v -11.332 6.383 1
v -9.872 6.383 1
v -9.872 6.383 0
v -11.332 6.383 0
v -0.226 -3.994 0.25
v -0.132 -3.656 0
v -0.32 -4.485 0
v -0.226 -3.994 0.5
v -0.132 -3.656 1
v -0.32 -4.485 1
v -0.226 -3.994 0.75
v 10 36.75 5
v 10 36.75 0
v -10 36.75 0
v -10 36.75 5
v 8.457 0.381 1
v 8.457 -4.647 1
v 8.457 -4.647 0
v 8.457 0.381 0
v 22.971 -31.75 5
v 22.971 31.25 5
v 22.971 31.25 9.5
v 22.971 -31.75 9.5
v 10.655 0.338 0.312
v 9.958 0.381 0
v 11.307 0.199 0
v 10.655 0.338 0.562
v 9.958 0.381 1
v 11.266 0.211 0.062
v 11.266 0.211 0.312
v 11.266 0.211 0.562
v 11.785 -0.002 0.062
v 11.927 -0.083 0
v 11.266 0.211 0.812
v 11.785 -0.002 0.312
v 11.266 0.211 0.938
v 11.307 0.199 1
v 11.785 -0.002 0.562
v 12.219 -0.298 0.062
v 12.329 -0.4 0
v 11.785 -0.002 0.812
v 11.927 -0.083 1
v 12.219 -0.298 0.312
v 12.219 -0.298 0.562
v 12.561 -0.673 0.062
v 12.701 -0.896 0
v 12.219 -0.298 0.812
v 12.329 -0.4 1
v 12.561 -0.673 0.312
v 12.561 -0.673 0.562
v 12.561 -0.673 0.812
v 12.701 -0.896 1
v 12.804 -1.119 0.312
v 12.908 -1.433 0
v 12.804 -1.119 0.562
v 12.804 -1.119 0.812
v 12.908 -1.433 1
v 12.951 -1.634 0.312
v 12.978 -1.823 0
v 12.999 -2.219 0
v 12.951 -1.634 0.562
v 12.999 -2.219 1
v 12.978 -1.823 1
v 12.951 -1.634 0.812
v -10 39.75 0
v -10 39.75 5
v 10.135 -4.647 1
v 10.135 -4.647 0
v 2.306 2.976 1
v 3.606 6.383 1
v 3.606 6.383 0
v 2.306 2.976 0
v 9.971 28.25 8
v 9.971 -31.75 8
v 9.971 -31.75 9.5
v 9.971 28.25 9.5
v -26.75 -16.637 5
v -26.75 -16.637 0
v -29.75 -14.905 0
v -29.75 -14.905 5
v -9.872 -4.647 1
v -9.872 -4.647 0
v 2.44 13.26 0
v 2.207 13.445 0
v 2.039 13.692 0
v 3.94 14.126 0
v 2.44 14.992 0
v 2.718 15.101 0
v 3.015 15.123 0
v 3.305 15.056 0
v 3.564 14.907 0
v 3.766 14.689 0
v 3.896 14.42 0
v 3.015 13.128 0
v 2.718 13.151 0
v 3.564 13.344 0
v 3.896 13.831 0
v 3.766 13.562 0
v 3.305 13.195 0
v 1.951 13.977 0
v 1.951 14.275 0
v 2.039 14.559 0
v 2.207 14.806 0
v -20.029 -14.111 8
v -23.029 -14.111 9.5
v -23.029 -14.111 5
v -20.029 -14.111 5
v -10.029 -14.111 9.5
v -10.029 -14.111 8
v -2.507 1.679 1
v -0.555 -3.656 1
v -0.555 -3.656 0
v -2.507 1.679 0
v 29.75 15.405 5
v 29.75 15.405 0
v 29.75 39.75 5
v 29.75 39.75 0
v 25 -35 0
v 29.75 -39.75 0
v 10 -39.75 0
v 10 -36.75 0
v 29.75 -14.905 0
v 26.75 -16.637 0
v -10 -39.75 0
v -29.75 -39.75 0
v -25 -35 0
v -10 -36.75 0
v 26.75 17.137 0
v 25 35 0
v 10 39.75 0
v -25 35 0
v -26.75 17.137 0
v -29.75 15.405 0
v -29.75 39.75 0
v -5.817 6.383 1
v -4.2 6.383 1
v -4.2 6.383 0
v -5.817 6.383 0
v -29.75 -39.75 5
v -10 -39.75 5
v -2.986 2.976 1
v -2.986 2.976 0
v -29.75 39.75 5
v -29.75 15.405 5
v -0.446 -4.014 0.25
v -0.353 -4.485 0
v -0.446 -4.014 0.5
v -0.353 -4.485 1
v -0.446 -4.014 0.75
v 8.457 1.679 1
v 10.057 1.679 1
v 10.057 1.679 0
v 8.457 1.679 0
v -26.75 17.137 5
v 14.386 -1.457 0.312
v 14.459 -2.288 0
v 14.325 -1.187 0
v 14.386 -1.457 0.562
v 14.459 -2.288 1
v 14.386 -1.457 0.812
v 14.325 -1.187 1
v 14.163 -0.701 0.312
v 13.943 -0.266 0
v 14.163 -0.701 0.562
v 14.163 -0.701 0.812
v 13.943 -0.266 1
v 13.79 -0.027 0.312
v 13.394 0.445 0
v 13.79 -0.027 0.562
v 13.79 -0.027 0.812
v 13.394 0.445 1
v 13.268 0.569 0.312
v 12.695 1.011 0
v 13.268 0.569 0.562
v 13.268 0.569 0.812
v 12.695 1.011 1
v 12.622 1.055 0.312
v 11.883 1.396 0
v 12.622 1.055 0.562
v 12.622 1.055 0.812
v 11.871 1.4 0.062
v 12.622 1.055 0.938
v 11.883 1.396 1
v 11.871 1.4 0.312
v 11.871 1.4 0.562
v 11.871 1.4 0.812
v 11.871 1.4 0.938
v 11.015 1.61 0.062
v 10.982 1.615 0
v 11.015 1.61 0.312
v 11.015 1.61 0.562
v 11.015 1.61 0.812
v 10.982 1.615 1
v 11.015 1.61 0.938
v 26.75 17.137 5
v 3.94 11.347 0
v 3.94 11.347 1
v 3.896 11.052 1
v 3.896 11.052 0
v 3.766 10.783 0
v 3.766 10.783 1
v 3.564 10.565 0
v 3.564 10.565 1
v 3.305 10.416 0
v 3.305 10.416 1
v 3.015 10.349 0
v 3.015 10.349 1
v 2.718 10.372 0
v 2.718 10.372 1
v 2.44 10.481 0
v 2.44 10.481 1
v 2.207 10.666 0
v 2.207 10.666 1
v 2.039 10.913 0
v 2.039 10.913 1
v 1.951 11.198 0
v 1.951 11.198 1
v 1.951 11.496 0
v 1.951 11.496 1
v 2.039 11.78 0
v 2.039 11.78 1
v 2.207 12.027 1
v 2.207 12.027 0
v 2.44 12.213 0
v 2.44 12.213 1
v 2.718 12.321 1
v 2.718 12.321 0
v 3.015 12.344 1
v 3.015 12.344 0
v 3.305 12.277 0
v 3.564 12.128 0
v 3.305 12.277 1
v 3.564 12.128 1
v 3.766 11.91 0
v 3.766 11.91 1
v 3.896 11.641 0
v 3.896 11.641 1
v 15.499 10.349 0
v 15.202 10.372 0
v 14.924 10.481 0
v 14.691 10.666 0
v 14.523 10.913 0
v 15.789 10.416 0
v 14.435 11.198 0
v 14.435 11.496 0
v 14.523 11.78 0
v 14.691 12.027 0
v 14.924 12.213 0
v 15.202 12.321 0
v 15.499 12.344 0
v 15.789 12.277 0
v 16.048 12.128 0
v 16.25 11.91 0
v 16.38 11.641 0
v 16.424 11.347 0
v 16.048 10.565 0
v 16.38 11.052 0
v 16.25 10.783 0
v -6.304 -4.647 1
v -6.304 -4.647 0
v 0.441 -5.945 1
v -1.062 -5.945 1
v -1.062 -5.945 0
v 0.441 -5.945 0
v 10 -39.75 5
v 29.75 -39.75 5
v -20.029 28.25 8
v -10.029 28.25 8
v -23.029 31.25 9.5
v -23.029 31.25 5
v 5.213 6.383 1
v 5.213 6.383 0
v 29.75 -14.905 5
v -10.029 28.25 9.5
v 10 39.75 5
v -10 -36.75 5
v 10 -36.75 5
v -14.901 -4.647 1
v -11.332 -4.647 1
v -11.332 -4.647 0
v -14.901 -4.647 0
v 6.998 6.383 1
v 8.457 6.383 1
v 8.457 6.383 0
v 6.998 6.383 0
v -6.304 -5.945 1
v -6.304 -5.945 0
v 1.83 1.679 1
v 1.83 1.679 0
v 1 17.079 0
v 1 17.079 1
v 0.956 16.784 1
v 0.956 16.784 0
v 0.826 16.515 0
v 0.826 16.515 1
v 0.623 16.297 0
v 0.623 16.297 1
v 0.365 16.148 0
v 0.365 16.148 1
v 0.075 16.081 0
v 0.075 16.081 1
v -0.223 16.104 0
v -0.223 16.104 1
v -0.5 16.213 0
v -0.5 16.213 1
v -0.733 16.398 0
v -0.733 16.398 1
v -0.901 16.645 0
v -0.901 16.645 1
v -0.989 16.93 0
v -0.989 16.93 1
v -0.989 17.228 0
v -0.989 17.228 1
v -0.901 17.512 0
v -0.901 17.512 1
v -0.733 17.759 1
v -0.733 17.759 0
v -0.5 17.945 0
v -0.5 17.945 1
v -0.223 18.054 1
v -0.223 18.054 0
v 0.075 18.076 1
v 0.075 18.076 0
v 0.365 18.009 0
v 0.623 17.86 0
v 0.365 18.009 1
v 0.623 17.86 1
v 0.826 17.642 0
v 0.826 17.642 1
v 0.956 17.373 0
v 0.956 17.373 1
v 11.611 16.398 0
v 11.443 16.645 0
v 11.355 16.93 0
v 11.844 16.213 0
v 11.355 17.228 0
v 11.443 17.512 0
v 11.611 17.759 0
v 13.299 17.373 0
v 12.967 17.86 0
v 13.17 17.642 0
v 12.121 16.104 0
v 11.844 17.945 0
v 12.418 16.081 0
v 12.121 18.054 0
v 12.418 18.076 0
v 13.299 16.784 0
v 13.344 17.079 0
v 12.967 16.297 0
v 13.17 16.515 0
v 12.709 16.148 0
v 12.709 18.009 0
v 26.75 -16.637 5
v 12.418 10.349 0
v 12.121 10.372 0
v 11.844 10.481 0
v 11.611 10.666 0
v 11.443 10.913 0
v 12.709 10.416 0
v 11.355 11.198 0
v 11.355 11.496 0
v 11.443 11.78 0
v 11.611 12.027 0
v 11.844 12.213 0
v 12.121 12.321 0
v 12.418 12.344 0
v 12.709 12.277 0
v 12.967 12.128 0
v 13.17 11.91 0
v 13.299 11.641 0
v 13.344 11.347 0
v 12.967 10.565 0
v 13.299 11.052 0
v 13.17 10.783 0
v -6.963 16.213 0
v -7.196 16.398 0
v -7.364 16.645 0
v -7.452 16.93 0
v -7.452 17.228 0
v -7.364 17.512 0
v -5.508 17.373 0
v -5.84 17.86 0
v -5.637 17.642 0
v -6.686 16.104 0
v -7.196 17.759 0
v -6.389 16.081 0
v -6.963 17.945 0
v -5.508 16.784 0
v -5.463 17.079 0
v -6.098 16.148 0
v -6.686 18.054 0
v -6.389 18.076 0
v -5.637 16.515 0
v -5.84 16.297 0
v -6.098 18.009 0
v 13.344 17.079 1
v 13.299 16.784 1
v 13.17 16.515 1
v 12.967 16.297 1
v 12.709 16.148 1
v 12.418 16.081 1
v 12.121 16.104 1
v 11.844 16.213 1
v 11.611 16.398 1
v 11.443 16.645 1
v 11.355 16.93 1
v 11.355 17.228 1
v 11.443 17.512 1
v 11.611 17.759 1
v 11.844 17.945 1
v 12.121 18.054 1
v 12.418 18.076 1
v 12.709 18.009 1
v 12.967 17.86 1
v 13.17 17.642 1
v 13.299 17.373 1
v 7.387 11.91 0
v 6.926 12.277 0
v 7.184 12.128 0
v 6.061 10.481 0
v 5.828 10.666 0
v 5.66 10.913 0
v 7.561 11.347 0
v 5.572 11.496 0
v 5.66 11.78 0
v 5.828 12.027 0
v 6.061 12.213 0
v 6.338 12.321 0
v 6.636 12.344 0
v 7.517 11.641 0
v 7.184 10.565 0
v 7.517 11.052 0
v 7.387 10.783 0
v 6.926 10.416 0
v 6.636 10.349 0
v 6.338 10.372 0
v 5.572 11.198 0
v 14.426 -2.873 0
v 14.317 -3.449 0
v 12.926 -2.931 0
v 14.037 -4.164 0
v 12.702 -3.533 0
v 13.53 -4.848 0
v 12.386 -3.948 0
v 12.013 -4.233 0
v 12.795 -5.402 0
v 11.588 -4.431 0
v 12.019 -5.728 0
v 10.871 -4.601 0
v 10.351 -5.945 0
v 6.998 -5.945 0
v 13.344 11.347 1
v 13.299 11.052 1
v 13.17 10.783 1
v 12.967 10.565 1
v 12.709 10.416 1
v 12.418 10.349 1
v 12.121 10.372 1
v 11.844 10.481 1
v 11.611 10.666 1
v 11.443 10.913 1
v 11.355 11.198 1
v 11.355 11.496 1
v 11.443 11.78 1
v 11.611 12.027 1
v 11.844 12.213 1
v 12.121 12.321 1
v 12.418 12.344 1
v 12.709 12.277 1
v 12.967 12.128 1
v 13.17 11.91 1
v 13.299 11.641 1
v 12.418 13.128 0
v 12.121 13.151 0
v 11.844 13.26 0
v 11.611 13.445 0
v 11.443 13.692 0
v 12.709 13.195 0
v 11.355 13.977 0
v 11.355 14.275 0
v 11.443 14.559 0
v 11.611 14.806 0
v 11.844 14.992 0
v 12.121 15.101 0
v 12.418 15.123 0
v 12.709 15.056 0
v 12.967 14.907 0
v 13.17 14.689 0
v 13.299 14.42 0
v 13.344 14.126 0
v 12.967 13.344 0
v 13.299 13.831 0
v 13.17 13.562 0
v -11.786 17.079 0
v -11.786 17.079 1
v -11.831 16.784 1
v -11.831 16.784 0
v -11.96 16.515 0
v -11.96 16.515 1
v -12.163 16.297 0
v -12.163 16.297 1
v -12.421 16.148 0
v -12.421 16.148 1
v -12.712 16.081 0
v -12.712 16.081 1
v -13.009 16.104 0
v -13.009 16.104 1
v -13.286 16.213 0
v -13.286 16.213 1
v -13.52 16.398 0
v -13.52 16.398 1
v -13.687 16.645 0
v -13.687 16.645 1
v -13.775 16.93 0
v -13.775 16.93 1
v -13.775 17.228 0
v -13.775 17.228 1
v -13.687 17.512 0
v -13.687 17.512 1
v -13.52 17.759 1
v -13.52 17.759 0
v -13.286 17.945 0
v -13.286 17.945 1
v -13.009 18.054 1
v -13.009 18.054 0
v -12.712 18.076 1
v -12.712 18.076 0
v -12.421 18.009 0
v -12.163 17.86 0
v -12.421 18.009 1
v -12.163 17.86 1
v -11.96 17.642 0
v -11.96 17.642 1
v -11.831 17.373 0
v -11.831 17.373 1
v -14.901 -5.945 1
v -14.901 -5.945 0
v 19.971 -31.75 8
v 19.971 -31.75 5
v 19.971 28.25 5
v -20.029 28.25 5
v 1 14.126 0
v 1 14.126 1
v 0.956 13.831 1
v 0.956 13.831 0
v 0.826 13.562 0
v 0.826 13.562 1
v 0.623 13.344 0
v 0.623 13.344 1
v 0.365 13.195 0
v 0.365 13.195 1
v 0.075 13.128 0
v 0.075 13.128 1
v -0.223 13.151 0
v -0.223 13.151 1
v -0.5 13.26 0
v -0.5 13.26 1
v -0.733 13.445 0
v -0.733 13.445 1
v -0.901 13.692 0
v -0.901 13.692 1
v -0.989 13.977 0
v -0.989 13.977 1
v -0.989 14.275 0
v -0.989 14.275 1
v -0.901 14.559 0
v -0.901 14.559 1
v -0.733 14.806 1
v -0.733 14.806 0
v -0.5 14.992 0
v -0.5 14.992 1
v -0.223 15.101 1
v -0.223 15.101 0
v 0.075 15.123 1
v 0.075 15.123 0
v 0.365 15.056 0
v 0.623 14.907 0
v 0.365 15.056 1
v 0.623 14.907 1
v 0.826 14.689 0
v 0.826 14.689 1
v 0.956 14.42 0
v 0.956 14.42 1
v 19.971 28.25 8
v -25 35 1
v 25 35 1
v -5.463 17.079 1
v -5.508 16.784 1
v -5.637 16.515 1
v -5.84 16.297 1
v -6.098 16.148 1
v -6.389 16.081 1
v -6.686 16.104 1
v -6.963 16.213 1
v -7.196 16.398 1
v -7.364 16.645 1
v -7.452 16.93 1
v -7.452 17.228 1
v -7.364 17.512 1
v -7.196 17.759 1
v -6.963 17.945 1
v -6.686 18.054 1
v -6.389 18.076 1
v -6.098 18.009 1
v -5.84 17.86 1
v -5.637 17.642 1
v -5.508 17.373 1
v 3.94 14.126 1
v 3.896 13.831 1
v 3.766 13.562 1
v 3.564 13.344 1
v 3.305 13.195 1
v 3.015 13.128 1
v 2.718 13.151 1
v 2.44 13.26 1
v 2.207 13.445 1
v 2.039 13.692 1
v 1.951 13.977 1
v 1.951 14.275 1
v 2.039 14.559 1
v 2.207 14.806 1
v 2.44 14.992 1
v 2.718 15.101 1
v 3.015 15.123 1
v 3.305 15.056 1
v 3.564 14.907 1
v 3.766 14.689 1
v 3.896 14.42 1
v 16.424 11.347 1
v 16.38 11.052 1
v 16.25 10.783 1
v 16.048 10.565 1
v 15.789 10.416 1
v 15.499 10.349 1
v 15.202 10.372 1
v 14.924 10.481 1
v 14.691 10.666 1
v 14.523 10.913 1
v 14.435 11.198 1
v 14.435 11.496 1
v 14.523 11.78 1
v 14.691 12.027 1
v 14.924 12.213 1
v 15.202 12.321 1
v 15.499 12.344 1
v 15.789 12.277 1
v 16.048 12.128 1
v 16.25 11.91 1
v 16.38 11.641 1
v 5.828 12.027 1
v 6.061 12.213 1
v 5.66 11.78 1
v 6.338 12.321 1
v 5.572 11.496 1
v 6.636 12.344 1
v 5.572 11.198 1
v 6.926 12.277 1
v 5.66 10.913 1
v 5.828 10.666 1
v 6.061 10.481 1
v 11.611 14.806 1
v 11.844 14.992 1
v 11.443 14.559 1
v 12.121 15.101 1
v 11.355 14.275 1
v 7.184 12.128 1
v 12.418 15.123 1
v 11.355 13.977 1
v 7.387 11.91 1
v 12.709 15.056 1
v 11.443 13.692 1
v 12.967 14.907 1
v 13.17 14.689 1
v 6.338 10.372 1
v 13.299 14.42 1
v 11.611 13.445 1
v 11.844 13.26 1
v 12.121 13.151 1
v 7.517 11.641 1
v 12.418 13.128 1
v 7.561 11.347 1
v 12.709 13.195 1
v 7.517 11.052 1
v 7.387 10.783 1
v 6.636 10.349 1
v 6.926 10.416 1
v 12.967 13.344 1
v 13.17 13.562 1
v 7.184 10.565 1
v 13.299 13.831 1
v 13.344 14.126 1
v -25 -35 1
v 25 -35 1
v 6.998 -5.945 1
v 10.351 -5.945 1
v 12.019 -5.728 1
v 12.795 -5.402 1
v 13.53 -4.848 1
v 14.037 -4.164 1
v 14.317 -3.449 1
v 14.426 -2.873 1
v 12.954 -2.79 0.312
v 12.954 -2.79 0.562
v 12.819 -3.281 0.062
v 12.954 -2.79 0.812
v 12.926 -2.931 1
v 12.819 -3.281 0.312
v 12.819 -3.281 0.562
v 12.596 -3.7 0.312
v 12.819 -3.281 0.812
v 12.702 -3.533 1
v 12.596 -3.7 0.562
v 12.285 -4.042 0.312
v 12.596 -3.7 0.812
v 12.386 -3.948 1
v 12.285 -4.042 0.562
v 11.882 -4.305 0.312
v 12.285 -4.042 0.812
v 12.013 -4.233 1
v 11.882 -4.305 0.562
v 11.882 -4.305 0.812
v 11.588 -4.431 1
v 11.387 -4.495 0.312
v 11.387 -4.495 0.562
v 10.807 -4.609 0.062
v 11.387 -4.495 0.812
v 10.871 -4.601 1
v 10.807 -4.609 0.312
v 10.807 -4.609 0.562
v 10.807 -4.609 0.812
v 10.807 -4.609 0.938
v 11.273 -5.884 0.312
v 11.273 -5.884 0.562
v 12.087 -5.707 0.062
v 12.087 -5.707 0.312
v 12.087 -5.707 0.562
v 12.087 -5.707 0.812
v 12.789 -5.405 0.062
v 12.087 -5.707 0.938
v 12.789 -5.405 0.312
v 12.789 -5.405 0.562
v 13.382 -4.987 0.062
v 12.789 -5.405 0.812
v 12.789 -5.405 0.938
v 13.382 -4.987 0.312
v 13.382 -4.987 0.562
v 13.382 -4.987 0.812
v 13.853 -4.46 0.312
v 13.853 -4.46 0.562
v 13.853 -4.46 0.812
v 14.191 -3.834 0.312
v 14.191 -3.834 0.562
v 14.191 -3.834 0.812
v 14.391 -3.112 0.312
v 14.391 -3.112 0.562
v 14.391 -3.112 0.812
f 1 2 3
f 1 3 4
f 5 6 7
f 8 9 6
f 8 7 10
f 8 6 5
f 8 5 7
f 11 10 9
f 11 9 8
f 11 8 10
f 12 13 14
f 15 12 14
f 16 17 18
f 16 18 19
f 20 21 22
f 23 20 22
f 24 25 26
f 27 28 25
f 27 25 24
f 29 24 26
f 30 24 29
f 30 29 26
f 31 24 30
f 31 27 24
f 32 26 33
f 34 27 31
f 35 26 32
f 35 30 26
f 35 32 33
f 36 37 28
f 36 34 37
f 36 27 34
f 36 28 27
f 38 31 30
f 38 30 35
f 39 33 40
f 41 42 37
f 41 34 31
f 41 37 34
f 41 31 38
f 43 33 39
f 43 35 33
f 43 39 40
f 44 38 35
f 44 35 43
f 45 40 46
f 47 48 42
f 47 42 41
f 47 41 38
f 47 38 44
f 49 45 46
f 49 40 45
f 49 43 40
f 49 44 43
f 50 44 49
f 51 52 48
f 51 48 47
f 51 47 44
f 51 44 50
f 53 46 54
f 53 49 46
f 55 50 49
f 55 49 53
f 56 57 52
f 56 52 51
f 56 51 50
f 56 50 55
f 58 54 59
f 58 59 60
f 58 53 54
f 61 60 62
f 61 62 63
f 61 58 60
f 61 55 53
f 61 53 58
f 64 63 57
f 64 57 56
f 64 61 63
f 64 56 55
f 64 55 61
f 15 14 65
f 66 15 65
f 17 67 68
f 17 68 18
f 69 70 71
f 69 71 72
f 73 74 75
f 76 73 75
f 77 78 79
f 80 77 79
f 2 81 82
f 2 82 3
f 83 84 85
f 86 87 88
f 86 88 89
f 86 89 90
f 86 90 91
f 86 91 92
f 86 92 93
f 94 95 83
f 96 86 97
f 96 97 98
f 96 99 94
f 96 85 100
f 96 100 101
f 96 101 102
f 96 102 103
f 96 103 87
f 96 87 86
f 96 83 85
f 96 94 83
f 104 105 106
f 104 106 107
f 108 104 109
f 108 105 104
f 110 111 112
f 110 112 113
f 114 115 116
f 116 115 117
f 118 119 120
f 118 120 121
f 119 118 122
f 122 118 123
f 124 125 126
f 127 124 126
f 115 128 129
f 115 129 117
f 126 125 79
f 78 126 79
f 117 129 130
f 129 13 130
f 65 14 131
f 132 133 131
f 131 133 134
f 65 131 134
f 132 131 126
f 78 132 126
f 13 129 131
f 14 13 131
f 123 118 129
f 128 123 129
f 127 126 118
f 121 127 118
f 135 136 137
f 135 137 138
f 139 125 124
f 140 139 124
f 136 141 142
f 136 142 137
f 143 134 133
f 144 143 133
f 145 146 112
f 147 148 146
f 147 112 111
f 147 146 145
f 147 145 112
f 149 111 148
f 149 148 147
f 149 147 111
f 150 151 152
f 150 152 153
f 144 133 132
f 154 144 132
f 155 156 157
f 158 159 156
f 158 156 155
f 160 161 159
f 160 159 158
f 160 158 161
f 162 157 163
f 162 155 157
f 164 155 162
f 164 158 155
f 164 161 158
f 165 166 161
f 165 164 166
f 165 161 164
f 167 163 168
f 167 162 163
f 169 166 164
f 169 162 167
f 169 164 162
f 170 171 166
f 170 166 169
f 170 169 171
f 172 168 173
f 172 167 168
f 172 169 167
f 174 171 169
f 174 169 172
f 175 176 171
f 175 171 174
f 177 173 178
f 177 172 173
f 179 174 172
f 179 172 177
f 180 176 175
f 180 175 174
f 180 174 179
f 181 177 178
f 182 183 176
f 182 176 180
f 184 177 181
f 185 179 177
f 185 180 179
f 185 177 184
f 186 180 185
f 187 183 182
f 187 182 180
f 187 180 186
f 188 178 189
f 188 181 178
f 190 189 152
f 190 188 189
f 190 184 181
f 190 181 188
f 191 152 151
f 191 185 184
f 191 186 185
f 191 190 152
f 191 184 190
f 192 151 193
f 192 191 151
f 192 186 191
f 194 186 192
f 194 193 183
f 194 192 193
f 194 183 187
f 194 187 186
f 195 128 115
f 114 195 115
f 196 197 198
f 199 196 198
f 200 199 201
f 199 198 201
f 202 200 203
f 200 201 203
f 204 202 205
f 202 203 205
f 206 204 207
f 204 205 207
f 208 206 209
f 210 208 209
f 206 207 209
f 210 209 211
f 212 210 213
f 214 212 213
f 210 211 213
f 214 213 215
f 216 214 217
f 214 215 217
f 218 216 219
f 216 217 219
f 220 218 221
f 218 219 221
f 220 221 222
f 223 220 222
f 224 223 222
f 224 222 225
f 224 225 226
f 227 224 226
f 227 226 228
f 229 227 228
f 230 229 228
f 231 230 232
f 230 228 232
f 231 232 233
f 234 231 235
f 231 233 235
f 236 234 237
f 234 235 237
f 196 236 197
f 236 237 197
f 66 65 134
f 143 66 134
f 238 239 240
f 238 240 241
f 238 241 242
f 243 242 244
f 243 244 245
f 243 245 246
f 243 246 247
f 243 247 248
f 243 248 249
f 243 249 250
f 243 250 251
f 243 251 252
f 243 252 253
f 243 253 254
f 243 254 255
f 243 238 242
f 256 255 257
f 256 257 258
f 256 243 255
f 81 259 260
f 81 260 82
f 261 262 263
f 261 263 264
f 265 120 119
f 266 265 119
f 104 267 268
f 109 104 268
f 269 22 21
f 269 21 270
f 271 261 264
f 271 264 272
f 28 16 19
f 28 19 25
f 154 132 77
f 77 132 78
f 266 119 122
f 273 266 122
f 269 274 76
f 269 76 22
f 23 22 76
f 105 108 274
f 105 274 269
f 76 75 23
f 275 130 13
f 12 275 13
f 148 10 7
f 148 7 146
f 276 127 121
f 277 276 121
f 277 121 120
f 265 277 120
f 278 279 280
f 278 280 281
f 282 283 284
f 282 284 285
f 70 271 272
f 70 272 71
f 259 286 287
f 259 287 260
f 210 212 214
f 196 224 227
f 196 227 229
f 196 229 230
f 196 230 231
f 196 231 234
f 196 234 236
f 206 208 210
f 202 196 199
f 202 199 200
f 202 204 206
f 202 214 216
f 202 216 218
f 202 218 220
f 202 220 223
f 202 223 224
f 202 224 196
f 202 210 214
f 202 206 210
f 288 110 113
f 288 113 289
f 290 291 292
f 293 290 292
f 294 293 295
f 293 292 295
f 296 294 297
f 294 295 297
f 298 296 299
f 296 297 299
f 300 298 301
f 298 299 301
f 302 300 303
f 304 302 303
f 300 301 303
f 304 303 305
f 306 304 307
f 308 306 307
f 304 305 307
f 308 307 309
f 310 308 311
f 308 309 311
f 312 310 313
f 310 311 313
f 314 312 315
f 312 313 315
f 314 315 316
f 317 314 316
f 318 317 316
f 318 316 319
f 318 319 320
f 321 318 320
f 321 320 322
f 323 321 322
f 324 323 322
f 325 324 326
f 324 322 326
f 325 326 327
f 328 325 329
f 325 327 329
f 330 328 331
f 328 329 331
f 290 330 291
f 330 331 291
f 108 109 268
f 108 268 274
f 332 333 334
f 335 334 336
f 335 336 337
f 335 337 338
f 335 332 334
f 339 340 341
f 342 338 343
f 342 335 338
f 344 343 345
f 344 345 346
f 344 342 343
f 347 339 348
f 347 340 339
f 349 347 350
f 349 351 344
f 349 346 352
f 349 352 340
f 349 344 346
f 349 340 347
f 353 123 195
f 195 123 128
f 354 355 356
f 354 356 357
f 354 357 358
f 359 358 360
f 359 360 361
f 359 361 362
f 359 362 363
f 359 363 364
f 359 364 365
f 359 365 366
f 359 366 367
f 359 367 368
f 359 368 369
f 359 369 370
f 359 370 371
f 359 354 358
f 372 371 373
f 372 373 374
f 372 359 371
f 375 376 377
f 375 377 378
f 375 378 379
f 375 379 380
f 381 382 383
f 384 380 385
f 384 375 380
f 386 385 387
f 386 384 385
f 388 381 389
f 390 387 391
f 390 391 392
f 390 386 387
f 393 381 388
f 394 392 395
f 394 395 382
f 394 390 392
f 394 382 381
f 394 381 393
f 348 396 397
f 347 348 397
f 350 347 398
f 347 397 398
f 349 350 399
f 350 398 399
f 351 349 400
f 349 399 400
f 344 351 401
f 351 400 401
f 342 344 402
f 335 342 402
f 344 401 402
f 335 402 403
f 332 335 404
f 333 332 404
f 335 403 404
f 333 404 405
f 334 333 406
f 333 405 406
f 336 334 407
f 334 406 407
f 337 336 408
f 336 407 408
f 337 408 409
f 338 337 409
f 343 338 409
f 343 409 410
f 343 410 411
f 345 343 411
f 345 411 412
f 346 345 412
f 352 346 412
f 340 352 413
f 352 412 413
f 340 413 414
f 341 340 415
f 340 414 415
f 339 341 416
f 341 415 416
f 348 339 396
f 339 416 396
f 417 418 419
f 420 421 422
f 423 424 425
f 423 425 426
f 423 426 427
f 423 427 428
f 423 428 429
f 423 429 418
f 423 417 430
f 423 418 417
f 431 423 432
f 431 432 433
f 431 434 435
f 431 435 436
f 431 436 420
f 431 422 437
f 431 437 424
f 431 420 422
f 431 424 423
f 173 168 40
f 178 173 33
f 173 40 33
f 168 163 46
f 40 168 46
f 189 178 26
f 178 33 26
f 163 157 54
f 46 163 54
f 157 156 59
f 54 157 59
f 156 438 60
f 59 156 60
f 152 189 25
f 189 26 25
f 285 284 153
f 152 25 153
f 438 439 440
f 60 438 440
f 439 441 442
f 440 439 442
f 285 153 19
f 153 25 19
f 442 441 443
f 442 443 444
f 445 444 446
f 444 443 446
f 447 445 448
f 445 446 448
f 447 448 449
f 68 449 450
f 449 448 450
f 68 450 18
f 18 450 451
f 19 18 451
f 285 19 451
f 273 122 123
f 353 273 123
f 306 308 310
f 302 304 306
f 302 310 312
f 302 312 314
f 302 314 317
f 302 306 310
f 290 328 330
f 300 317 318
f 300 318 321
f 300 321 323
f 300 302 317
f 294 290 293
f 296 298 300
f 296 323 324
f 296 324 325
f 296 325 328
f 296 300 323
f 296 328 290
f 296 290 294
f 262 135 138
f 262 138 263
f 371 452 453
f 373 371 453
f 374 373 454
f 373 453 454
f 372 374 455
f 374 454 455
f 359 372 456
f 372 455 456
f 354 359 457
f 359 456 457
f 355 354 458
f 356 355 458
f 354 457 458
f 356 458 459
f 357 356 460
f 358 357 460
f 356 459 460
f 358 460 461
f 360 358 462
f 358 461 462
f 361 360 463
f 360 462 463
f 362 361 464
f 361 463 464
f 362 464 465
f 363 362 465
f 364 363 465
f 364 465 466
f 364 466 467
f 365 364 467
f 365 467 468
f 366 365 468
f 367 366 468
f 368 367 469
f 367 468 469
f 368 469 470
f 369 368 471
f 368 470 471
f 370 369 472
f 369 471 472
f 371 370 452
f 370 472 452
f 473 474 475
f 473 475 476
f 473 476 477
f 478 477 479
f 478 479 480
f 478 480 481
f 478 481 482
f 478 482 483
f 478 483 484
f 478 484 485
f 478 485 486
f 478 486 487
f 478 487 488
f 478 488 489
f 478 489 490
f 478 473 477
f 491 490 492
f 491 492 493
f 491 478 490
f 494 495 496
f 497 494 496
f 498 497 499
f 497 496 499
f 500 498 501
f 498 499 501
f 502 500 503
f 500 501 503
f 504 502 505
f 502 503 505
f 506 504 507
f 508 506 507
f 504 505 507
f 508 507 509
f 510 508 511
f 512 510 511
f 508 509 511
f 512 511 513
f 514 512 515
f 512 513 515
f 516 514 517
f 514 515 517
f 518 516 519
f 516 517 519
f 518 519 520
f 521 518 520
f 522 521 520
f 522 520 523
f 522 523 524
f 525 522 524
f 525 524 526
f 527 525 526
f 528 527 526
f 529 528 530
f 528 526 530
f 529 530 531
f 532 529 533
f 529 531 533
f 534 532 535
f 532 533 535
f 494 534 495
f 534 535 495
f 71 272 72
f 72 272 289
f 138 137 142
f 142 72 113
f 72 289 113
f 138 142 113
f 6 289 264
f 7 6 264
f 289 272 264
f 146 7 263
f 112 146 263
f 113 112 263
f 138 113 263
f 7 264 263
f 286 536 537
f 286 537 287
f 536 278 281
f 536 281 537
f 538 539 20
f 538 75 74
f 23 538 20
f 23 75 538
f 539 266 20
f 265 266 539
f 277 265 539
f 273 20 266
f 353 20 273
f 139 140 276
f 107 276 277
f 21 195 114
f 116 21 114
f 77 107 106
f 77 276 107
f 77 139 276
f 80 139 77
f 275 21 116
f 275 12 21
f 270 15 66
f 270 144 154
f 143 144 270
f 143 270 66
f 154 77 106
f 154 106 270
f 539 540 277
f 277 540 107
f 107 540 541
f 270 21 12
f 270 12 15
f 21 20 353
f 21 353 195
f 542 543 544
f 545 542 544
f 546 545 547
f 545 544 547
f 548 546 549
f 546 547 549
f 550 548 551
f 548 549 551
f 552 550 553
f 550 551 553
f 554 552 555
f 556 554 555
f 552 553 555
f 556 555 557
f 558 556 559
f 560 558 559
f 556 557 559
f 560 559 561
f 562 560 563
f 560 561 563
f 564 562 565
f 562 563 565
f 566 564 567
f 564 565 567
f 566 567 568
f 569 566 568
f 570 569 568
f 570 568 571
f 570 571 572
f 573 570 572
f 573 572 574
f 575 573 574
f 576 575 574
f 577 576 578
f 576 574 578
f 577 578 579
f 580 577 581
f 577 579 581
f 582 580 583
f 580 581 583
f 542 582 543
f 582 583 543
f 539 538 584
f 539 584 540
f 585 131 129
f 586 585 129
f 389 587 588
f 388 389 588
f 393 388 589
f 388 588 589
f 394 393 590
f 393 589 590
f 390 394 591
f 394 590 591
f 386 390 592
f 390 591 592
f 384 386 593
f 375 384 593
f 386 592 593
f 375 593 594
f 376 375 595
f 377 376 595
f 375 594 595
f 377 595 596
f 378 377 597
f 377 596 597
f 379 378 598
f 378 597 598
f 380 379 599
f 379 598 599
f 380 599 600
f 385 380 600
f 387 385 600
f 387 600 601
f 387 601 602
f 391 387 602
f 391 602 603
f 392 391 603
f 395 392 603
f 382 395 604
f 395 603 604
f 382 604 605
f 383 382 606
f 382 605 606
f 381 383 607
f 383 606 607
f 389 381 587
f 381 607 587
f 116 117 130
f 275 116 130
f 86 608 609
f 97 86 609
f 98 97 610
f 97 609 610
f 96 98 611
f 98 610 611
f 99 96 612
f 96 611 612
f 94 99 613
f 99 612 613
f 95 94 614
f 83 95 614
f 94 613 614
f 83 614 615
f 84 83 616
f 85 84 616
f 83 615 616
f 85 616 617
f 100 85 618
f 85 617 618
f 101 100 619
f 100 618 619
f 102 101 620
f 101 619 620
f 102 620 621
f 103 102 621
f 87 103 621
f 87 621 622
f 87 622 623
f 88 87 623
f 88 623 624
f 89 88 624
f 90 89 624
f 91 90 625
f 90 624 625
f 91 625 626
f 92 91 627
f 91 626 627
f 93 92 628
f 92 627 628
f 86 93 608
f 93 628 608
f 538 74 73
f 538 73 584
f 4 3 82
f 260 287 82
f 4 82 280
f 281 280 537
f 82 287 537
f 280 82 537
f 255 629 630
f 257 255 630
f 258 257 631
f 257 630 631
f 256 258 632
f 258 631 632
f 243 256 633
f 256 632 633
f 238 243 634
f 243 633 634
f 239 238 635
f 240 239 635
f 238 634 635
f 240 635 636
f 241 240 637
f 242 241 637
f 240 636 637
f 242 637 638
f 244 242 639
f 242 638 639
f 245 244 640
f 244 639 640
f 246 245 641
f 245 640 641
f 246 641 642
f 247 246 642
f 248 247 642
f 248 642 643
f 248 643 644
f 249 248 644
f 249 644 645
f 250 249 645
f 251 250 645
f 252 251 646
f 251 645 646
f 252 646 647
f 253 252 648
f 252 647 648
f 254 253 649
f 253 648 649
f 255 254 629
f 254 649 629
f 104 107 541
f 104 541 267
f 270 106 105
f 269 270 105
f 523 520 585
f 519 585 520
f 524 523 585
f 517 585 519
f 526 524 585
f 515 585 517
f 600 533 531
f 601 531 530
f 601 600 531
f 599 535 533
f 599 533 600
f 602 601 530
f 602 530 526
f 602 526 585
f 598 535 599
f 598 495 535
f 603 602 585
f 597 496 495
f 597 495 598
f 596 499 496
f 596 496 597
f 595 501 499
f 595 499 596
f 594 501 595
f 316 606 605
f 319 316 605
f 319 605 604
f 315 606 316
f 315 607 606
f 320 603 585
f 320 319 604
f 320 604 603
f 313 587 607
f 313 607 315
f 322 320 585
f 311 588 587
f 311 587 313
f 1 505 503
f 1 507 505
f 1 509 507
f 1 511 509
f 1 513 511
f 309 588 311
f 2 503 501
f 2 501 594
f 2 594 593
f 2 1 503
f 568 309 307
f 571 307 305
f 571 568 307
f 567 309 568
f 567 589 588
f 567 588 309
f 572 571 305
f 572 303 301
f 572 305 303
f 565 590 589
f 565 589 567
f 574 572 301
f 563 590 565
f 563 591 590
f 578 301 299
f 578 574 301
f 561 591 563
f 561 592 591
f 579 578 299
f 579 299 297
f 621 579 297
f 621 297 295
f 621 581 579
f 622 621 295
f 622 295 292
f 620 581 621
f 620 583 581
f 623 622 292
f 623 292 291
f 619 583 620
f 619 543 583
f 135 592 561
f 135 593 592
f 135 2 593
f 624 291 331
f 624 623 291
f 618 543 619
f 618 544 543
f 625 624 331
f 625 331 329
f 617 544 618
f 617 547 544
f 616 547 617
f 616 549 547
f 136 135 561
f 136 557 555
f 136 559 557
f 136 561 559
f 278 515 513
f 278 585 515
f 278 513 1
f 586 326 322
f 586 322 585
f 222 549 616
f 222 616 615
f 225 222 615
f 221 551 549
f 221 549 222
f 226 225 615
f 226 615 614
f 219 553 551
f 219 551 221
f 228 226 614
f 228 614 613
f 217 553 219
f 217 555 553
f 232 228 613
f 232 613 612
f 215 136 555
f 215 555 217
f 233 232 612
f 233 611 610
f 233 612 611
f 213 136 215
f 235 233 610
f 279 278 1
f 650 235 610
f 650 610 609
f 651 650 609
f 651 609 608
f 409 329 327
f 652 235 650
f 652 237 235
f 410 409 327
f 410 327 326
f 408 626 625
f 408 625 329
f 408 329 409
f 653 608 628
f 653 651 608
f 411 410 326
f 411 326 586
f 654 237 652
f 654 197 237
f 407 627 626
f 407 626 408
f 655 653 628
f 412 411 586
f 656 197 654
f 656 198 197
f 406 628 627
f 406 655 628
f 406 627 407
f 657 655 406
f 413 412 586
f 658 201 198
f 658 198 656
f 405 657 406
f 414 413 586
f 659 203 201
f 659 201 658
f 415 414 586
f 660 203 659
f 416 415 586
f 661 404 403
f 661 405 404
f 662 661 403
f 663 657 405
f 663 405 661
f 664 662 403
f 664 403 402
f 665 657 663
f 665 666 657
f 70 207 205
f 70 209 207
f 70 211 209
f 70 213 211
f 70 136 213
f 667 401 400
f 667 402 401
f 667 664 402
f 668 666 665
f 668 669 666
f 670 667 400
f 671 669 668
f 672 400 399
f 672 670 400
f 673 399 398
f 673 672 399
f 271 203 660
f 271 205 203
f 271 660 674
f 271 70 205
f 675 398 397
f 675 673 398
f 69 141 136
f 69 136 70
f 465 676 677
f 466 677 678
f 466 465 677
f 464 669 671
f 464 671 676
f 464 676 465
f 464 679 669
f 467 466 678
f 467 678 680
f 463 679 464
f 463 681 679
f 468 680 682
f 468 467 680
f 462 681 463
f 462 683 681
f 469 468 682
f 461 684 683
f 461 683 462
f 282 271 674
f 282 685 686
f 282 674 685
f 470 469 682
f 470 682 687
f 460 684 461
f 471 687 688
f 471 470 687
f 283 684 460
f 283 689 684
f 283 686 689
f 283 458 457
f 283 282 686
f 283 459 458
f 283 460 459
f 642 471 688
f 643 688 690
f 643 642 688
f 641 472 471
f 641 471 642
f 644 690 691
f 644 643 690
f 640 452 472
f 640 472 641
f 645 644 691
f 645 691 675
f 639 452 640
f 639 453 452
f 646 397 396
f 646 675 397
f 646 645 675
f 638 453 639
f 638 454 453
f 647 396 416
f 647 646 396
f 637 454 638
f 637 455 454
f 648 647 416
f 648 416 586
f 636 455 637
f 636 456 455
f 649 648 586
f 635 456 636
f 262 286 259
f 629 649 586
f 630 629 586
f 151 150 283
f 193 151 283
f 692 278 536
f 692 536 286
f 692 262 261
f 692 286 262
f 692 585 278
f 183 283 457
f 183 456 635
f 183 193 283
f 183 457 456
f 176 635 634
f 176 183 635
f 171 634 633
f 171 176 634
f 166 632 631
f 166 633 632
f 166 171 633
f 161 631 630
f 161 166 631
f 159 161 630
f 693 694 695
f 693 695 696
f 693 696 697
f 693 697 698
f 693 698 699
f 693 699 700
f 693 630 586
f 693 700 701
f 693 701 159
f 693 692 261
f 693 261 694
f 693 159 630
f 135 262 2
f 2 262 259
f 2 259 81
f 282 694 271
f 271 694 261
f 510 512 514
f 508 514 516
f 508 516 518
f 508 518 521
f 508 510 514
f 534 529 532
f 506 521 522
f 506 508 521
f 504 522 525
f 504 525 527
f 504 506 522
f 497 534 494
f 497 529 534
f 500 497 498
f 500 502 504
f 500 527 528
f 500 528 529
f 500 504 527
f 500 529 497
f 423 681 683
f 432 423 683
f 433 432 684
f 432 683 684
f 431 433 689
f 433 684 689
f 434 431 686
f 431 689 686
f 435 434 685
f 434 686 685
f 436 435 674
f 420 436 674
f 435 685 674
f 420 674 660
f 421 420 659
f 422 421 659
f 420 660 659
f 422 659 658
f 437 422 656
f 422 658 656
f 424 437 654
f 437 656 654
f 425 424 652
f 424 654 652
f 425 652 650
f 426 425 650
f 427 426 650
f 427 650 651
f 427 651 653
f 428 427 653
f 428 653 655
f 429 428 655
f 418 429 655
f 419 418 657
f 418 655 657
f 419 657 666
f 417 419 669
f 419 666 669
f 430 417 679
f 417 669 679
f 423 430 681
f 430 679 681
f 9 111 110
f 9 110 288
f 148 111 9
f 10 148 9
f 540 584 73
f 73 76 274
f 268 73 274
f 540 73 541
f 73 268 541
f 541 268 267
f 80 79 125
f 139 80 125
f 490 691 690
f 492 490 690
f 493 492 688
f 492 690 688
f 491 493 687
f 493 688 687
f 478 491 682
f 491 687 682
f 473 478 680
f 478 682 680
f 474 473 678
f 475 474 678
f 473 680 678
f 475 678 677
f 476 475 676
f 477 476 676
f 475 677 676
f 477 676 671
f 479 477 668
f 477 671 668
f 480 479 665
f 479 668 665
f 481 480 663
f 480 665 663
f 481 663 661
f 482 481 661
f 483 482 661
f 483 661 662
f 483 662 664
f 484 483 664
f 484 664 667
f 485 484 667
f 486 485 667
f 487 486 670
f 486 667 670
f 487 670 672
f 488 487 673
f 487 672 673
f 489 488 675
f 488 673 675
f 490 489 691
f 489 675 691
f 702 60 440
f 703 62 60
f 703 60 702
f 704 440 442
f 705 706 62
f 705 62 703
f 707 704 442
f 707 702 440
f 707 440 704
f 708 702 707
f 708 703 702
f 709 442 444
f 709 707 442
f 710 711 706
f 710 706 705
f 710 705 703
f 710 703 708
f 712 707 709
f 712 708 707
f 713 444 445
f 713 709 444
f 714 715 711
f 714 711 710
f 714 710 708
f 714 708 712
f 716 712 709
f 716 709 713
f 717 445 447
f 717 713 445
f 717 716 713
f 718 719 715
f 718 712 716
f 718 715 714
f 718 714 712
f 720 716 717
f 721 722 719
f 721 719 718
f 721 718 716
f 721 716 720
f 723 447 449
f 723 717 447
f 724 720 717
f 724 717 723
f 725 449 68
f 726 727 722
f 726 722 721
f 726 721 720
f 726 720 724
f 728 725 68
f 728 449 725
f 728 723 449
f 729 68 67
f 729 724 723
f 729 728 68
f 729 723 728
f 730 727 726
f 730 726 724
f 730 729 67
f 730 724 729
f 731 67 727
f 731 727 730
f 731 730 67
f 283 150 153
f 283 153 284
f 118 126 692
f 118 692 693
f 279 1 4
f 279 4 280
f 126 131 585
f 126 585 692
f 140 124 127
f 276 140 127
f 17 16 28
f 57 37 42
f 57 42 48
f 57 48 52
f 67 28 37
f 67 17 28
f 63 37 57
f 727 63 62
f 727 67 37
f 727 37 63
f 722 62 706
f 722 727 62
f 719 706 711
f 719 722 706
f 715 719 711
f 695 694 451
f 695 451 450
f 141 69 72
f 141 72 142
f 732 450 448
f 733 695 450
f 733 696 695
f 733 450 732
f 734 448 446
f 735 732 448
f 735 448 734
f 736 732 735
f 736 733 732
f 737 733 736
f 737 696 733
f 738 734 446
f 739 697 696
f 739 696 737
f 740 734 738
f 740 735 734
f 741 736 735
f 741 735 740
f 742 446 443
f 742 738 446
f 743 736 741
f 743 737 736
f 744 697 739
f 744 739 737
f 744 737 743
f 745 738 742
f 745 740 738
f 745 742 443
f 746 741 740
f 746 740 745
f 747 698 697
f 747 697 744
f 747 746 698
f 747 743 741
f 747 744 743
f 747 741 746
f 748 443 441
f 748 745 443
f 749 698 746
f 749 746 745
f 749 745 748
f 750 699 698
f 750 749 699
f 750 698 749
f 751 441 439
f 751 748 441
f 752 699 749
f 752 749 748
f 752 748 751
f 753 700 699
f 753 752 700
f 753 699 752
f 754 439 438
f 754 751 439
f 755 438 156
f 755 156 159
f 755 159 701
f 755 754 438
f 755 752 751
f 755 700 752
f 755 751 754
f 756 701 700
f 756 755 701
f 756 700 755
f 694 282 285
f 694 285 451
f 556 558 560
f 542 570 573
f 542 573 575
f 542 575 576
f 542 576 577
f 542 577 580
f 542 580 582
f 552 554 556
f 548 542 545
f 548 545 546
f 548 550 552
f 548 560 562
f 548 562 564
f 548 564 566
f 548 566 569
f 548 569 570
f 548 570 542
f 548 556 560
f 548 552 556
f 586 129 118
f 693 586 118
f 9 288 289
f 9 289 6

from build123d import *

# Parameters (mm, degrees)
BOSS_EXTRUDE1_DEPTH = 5
BOSS_EXTRUDE2_START = -5
SKETCH6_W           = 3
SKETCH6_H           = 3
SKETCH6_H_2         = 1.5
SKETCH6_W_2         = 10
BOSS_EXTRUDE2_DEPTH = 60
SKETCH7_W           = 46
SKETCH7_H           = 4.5
BOSS_EXTRUDE3_DEPTH = 3
SKETCH8_W           = 50
SKETCH8_H           = 70
CUT_EXTRUDE2_DEPTH  = 1
SKETCH9_R           = 1
BOSS_EXTRUDE4_DEPTH = 1
CUT_EXTRUDE3_REACH  = 52.551
SKETCH10_W          = 13.006782721
SKETCH10_H          = 17.639239295


with BuildPart() as part:
    # Sketch4 → Boss-Extrude1 (new body)
    with BuildSketch(Plane(origin=(0, 0, 0), x_dir=(0, 1, 0), z_dir=(0, 0, 1))):
        Polygon((-39.75, -29.75), (-14.905444566, -29.75), (-16.637495374, -26.75), (0.24999995, -26.75), (17.137495374, -26.75), (15.405444566, -29.75), (39.75, -29.75), (39.75, -10), (36.75, -10), (36.75, 10), (39.75, 10), (39.75, 29.75), (15.405444566, 29.75), (17.137495374, 26.75), (0.250000065, 26.75), (-16.637495374, 26.75), (-14.905444566, 29.75), (-39.75, 29.75), (-39.75, 10), (-36.75, 10), (-36.75, -10), (-39.75, -10), align=None)
    extrude(amount=BOSS_EXTRUDE1_DEPTH)

    # Sketch6 → Boss-Extrude2 (add)
    with BuildSketch(Plane.XZ.offset(36.75).offset(BOSS_EXTRUDE2_START)):
        with Locations((-21.528635138, 6.5)):
            Rectangle(SKETCH6_W, SKETCH6_H)
        with Locations((-21.528635138, 8.75)):
            Rectangle(SKETCH6_W, SKETCH6_H_2)
        with Locations((-15.028635138, 8.75)):
            Rectangle(SKETCH6_W_2, SKETCH6_H_2)
        with Locations((21.471364862, 6.5)):
            Rectangle(SKETCH6_W, SKETCH6_H)
        with Locations((21.471364862, 8.75)):
            Rectangle(SKETCH6_W, SKETCH6_H_2)
        with Locations((14.971364862, 8.75)):
            Rectangle(SKETCH6_W_2, SKETCH6_H_2)
    extrude(amount=-BOSS_EXTRUDE2_DEPTH)

    # Sketch7 → Boss-Extrude3 (add)
    with BuildSketch(Plane(origin=(0, 28.25, 0), x_dir=(-1, 0, 0), z_dir=(0, 1, 0))):
        with Locations((0.028635138, 7.25)):
            Rectangle(SKETCH7_W, SKETCH7_H)
    extrude(amount=BOSS_EXTRUDE3_DEPTH)

    # Sketch8 → Cut-Extrude2 (cut)
    with BuildSketch(Plane(origin=(0, 0, 0), x_dir=(1, 0, 0), z_dir=(0, 0, -1))):
        Rectangle(SKETCH8_W, SKETCH8_H)
    extrude(amount=-CUT_EXTRUDE2_DEPTH, mode=Mode.SUBTRACT)

    # Sketch9 → Boss-Extrude4 (add)
    # profile 1 of 14: a face of its own
    with BuildSketch(Plane(origin=(0, 0, 1), x_dir=(1, 0, 0), z_dir=(0, 0, -1))):
        with Locations((-12.786487011, -17.078606255)):
            Circle(SKETCH9_R)
    # profile 2 of 14: a face of its own
    with BuildSketch(Plane(origin=(0, 0, 1), x_dir=(1, 0, 0), z_dir=(0, 0, -1))):
        with Locations((-6.463434267, -17.078606255)):
            Circle(SKETCH9_R)
    # profile 3 of 14: a face of its own
    with BuildSketch(Plane(origin=(0, 0, 1), x_dir=(1, 0, 0), z_dir=(0, 0, -1))):
        with Locations((0, -17.078606255)):
            Circle(SKETCH9_R)
    # profile 4 of 14: a face of its own
    with BuildSketch(Plane(origin=(0, 0, 1), x_dir=(1, 0, 0), z_dir=(0, 0, -1))):
        with Locations((0, -14.125611289)):
            Circle(SKETCH9_R)
    # profile 5 of 14: a face of its own
    with BuildSketch(Plane(origin=(0, 0, 1), x_dir=(1, 0, 0), z_dir=(0, 0, -1))):
        with Locations((2.94008007, -14.125611289)):
            Circle(SKETCH9_R)
    # profile 6 of 14: a face of its own
    with BuildSketch(Plane(origin=(0, 0, 1), x_dir=(1, 0, 0), z_dir=(0, 0, -1))):
        with Locations((2.94008007, -11.346566296)):
            Circle(SKETCH9_R)
    # profile 7 of 14: a face of its own
    with BuildSketch(Plane(origin=(0, 0, 1), x_dir=(1, 0, 0), z_dir=(0, 0, -1))):
        with Locations((6.560973521, -11.346566296)):
            Circle(SKETCH9_R)
    # profile 8 of 14: a face of its own
    with BuildSketch(Plane(origin=(0, 0, 1), x_dir=(1, 0, 0), z_dir=(0, 0, -1))):
        with Locations((12.343594407, -11.346566296)):
            Circle(SKETCH9_R)
    # profile 9 of 14: a face of its own
    with BuildSketch(Plane(origin=(0, 0, 1), x_dir=(1, 0, 0), z_dir=(0, 0, -1))):
        with Locations((12.343594407, -14.125611289)):
            Circle(SKETCH9_R)
    # profile 10 of 14: a face of its own
    with BuildSketch(Plane(origin=(0, 0, 1), x_dir=(1, 0, 0), z_dir=(0, 0, -1))):
        with Locations((12.343594407, -17.078606255)):
            Circle(SKETCH9_R)
    # profile 11 of 14: a face of its own
    with BuildSketch(Plane(origin=(0, 0, 1), x_dir=(1, 0, 0), z_dir=(0, 0, -1))):
        with Locations((15.424056, -11.346566296)):
            Circle(SKETCH9_R)
    # profile 12 of 14: a face of its own
    with BuildSketch(Plane(origin=(0, 0, 1), x_dir=(1, 0, 0), z_dir=(0, 0, -1))):
        Polygon((-6.303627236, 4.647475362), (-9.872238462, 4.647475362), (-9.872238462, -6.382777516), (-11.332124872, -6.382777516), (-11.332124872, 4.647475362), (-14.900736097, 4.647475362), (-14.900736097, 5.945152171), (-6.303627236, 5.945152171), align=None)
    # profile 13 of 14: a face of its own
    with BuildSketch(Plane(origin=(0, 0, 1), x_dir=(1, 0, 0), z_dir=(0, 0, -1))):
        Polygon((5.213254446, -6.382777516), (3.606365584, -6.382777516), (2.30615425, -2.976375892), (-2.985933988, -2.976375892), (-4.199971471, -6.382777516), (-5.816998433, -6.382777516), (-1.062229499, 5.945152171), (0.440743837, 5.945152171), align=None)
        with BuildLine():
            Line((1.829663547, -1.678699083), (-0.132058817, 3.65647608))
            add(Edge.make_bspline(
                [(-0.132058817, 3.65647608), (-0.147664764, 3.706203134), (-0.182599633, 3.817520196), (-0.230569306, 4.004992715), (-0.27451989, 4.232251444), (-0.303796625, 4.396518738), (-0.319613669, 4.485265761)],
                knots=[0, 0, 0, 0, 0.735233958, 1.645866306, 2.728156085, 4, 4, 4, 4], degree=3))
            Line((-0.319613669, 4.485265761), (-0.352562494, 4.485265761))
            add(Edge.make_bspline(
                [(-0.352562494, 4.485265761), (-0.367323874, 4.402388942), (-0.395422699, 4.244629907), (-0.442062801, 4.022554742), (-0.494871195, 3.828782863), (-0.536126975, 3.711193738), (-0.555324495, 3.65647608)],
                knots=[0, 0, 0, 0, 1.1821815, 2.250325448, 3.185825268, 4, 4, 4, 4], degree=3))
            Line((-0.555324495, 3.65647608), (-2.506908759, -1.678699083))
            Line((-2.506908759, -1.678699083), (1.829663547, -1.678699083))
        make_face(mode=Mode.SUBTRACT)
    # profile 14 of 14: a face of its own
    with BuildSketch(Plane(origin=(0, 0, 1), x_dir=(1, 0, 0), z_dir=(0, 0, -1))):
        with BuildLine():
            Line((8.457446469, -1.678699083), (8.457446469, -6.382777516))
            Line((8.457446469, -6.382777516), (6.997560058, -6.382777516))
            Line((6.997560058, -6.382777516), (6.997560058, 5.945152171))
            Line((6.997560058, 5.945152171), (10.350736657, 5.945152171))
            add(Edge.make_bspline(
                [(10.350736657, 5.945152171), (10.509695311, 5.94250725), (10.818166439, 5.937374583), (11.266927294, 5.88984235), (11.688470568, 5.818158675), (12.083717966, 5.715231867), (12.449844904, 5.577532383), (12.788978426, 5.411630082), (13.10398336, 5.220680323), (13.384579674, 4.991925283), (13.640330715, 4.742713756), (13.858595137, 4.463555677), (14.046290599, 4.161729634), (14.198048848, 3.833912071), (14.314343043, 3.48152593), (14.397958134, 3.105462584), (14.449017319, 2.704893846), (14.455752673, 2.42907422), (14.459201711, 2.28783257)],
                knots=[0, 0, 0, 0, 1.220578922, 2.368624473, 3.462135539, 4.502544785, 5.500522599, 6.461134096, 7.399369976, 8.322607956, 9.235733545, 10.136695962, 11.037097352, 11.960312526, 12.90425338, 13.881897398, 14.915362519, 16, 16, 16, 16], degree=3))
            add(Edge.make_bspline(
                [(14.459201711, 2.28783257), (14.456125133, 2.145713753), (14.450093475, 1.867088625), (14.392842954, 1.458577322), (14.298798135, 1.070067677), (14.170811012, 0.698864827), (13.997972005, 0.351851734), (13.795716853, 0.020347803), (13.548830266, -0.286010644), (13.271970609, -0.574267746), (12.963200376, -0.836054299), (12.624253148, -1.061978102), (12.259784751, -1.253070736), (11.868668942, -1.407989064), (11.451812999, -1.528768286), (11.009560292, -1.618354116), (10.541130741, -1.668202008), (10.220744681, -1.675144873), (10.056731755, -1.678699083)],
                knots=[0, 0, 0, 0, 1.022395889, 2.004415688, 2.961535425, 3.896140743, 4.82343876, 5.746400737, 6.685563929, 7.648805907, 8.619636875, 9.592693104, 10.574524643, 11.576040996, 12.61506259, 13.694246144, 14.819632053, 16, 16, 16, 16], degree=3))
            Line((10.056731755, -1.678699083), (8.457446469, -1.678699083))
        make_face()
        with BuildLine():
            Line((8.457446469, 4.647475362), (8.457446469, -0.381022274))
            Line((8.457446469, -0.381022274), (9.957885279, -0.381022274))
            add(Edge.make_bspline(
                [(9.957885279, -0.381022274), (10.077940481, -0.379452684), (10.31093283, -0.376406565), (10.649599833, -0.342109598), (10.966509261, -0.289852539), (11.262229227, -0.217435817), (11.534525044, -0.120826947), (11.784771245, -0.00343225), (12.015027367, 0.132656375), (12.220130693, 0.293746461), (12.40507983, 0.471885839), (12.564099334, 0.670006443), (12.701263006, 0.885087886), (12.808528198, 1.119672064), (12.896289259, 1.369569482), (12.956358781, 1.637465518), (12.991871549, 1.922744559), (12.996789996, 2.118759427), (12.999315301, 2.219400395)],
                knots=[0, 0, 0, 0, 1.265277681, 2.455537233, 3.584498775, 4.649494157, 5.660845971, 6.625094694, 7.559934571, 8.473920379, 9.368340756, 10.261385271, 11.146040016, 12.050559185, 12.974472874, 13.933813817, 14.939146914, 16, 16, 16, 16], degree=3))
            add(Edge.make_bspline(
                [(12.999315301, 2.219400395), (12.997979793, 2.317539924), (12.995379811, 2.508599083), (12.957720492, 2.784773853), (12.904092134, 3.042639571), (12.823919422, 3.279856734), (12.726105371, 3.500854512), (12.600929429, 3.700909707), (12.454878872, 3.883183964), (12.286699993, 4.047522092), (12.093084536, 4.187745781), (11.87946034, 4.311880083), (11.642587123, 4.414603882), (11.384078714, 4.500966841), (11.102977848, 4.565807264), (10.800766648, 4.614221035), (10.475423413, 4.641369896), (10.251093913, 4.6453968), (10.13530203, 4.647475362)],
                knots=[0, 0, 0, 0, 1.094831488, 2.131430464, 3.106461648, 4.031144782, 4.921863596, 5.798739979, 6.657572552, 7.524756014, 8.415225068, 9.319623649, 10.278320726, 11.292489325, 12.358664814, 13.495361146, 14.707183632, 16, 16, 16, 16], degree=3))
            Line((10.13530203, 4.647475362), (8.457446469, 4.647475362))
        make_face(mode=Mode.SUBTRACT)
    extrude(amount=BOSS_EXTRUDE4_DEPTH)

    # Cut-Extrude3: up to this face of the body (flat: up to its plane)
    cut_extrude3_end = Plane(part.part.faces().sort_by_distance((0.003637838, -0.898870224, 5))[0])
    # Sketch10 → Cut-Extrude3 (cut, up to the picked face)
    with BuildSketch(Plane.XY.offset(9.5), mode=Mode.PRIVATE) as cut_extrude3_sk1:
        with Locations((-16.525243778, -22.930380353)):
            Rectangle(SKETCH10_W, SKETCH10_H)
    cut_extrude3_tool1 = split(extrude(cut_extrude3_sk1.sketch, amount=-CUT_EXTRUDE3_REACH, mode=Mode.PRIVATE), bisect_by=cut_extrude3_end, keep=Keep.BOTH, mode=Mode.PRIVATE)
    add(cut_extrude3_tool1.solids().sort_by(Axis((-16.525244, -22.93038, 9.5), (0, 0, -1)))[0], mode=Mode.SUBTRACT)


solid = part.part
